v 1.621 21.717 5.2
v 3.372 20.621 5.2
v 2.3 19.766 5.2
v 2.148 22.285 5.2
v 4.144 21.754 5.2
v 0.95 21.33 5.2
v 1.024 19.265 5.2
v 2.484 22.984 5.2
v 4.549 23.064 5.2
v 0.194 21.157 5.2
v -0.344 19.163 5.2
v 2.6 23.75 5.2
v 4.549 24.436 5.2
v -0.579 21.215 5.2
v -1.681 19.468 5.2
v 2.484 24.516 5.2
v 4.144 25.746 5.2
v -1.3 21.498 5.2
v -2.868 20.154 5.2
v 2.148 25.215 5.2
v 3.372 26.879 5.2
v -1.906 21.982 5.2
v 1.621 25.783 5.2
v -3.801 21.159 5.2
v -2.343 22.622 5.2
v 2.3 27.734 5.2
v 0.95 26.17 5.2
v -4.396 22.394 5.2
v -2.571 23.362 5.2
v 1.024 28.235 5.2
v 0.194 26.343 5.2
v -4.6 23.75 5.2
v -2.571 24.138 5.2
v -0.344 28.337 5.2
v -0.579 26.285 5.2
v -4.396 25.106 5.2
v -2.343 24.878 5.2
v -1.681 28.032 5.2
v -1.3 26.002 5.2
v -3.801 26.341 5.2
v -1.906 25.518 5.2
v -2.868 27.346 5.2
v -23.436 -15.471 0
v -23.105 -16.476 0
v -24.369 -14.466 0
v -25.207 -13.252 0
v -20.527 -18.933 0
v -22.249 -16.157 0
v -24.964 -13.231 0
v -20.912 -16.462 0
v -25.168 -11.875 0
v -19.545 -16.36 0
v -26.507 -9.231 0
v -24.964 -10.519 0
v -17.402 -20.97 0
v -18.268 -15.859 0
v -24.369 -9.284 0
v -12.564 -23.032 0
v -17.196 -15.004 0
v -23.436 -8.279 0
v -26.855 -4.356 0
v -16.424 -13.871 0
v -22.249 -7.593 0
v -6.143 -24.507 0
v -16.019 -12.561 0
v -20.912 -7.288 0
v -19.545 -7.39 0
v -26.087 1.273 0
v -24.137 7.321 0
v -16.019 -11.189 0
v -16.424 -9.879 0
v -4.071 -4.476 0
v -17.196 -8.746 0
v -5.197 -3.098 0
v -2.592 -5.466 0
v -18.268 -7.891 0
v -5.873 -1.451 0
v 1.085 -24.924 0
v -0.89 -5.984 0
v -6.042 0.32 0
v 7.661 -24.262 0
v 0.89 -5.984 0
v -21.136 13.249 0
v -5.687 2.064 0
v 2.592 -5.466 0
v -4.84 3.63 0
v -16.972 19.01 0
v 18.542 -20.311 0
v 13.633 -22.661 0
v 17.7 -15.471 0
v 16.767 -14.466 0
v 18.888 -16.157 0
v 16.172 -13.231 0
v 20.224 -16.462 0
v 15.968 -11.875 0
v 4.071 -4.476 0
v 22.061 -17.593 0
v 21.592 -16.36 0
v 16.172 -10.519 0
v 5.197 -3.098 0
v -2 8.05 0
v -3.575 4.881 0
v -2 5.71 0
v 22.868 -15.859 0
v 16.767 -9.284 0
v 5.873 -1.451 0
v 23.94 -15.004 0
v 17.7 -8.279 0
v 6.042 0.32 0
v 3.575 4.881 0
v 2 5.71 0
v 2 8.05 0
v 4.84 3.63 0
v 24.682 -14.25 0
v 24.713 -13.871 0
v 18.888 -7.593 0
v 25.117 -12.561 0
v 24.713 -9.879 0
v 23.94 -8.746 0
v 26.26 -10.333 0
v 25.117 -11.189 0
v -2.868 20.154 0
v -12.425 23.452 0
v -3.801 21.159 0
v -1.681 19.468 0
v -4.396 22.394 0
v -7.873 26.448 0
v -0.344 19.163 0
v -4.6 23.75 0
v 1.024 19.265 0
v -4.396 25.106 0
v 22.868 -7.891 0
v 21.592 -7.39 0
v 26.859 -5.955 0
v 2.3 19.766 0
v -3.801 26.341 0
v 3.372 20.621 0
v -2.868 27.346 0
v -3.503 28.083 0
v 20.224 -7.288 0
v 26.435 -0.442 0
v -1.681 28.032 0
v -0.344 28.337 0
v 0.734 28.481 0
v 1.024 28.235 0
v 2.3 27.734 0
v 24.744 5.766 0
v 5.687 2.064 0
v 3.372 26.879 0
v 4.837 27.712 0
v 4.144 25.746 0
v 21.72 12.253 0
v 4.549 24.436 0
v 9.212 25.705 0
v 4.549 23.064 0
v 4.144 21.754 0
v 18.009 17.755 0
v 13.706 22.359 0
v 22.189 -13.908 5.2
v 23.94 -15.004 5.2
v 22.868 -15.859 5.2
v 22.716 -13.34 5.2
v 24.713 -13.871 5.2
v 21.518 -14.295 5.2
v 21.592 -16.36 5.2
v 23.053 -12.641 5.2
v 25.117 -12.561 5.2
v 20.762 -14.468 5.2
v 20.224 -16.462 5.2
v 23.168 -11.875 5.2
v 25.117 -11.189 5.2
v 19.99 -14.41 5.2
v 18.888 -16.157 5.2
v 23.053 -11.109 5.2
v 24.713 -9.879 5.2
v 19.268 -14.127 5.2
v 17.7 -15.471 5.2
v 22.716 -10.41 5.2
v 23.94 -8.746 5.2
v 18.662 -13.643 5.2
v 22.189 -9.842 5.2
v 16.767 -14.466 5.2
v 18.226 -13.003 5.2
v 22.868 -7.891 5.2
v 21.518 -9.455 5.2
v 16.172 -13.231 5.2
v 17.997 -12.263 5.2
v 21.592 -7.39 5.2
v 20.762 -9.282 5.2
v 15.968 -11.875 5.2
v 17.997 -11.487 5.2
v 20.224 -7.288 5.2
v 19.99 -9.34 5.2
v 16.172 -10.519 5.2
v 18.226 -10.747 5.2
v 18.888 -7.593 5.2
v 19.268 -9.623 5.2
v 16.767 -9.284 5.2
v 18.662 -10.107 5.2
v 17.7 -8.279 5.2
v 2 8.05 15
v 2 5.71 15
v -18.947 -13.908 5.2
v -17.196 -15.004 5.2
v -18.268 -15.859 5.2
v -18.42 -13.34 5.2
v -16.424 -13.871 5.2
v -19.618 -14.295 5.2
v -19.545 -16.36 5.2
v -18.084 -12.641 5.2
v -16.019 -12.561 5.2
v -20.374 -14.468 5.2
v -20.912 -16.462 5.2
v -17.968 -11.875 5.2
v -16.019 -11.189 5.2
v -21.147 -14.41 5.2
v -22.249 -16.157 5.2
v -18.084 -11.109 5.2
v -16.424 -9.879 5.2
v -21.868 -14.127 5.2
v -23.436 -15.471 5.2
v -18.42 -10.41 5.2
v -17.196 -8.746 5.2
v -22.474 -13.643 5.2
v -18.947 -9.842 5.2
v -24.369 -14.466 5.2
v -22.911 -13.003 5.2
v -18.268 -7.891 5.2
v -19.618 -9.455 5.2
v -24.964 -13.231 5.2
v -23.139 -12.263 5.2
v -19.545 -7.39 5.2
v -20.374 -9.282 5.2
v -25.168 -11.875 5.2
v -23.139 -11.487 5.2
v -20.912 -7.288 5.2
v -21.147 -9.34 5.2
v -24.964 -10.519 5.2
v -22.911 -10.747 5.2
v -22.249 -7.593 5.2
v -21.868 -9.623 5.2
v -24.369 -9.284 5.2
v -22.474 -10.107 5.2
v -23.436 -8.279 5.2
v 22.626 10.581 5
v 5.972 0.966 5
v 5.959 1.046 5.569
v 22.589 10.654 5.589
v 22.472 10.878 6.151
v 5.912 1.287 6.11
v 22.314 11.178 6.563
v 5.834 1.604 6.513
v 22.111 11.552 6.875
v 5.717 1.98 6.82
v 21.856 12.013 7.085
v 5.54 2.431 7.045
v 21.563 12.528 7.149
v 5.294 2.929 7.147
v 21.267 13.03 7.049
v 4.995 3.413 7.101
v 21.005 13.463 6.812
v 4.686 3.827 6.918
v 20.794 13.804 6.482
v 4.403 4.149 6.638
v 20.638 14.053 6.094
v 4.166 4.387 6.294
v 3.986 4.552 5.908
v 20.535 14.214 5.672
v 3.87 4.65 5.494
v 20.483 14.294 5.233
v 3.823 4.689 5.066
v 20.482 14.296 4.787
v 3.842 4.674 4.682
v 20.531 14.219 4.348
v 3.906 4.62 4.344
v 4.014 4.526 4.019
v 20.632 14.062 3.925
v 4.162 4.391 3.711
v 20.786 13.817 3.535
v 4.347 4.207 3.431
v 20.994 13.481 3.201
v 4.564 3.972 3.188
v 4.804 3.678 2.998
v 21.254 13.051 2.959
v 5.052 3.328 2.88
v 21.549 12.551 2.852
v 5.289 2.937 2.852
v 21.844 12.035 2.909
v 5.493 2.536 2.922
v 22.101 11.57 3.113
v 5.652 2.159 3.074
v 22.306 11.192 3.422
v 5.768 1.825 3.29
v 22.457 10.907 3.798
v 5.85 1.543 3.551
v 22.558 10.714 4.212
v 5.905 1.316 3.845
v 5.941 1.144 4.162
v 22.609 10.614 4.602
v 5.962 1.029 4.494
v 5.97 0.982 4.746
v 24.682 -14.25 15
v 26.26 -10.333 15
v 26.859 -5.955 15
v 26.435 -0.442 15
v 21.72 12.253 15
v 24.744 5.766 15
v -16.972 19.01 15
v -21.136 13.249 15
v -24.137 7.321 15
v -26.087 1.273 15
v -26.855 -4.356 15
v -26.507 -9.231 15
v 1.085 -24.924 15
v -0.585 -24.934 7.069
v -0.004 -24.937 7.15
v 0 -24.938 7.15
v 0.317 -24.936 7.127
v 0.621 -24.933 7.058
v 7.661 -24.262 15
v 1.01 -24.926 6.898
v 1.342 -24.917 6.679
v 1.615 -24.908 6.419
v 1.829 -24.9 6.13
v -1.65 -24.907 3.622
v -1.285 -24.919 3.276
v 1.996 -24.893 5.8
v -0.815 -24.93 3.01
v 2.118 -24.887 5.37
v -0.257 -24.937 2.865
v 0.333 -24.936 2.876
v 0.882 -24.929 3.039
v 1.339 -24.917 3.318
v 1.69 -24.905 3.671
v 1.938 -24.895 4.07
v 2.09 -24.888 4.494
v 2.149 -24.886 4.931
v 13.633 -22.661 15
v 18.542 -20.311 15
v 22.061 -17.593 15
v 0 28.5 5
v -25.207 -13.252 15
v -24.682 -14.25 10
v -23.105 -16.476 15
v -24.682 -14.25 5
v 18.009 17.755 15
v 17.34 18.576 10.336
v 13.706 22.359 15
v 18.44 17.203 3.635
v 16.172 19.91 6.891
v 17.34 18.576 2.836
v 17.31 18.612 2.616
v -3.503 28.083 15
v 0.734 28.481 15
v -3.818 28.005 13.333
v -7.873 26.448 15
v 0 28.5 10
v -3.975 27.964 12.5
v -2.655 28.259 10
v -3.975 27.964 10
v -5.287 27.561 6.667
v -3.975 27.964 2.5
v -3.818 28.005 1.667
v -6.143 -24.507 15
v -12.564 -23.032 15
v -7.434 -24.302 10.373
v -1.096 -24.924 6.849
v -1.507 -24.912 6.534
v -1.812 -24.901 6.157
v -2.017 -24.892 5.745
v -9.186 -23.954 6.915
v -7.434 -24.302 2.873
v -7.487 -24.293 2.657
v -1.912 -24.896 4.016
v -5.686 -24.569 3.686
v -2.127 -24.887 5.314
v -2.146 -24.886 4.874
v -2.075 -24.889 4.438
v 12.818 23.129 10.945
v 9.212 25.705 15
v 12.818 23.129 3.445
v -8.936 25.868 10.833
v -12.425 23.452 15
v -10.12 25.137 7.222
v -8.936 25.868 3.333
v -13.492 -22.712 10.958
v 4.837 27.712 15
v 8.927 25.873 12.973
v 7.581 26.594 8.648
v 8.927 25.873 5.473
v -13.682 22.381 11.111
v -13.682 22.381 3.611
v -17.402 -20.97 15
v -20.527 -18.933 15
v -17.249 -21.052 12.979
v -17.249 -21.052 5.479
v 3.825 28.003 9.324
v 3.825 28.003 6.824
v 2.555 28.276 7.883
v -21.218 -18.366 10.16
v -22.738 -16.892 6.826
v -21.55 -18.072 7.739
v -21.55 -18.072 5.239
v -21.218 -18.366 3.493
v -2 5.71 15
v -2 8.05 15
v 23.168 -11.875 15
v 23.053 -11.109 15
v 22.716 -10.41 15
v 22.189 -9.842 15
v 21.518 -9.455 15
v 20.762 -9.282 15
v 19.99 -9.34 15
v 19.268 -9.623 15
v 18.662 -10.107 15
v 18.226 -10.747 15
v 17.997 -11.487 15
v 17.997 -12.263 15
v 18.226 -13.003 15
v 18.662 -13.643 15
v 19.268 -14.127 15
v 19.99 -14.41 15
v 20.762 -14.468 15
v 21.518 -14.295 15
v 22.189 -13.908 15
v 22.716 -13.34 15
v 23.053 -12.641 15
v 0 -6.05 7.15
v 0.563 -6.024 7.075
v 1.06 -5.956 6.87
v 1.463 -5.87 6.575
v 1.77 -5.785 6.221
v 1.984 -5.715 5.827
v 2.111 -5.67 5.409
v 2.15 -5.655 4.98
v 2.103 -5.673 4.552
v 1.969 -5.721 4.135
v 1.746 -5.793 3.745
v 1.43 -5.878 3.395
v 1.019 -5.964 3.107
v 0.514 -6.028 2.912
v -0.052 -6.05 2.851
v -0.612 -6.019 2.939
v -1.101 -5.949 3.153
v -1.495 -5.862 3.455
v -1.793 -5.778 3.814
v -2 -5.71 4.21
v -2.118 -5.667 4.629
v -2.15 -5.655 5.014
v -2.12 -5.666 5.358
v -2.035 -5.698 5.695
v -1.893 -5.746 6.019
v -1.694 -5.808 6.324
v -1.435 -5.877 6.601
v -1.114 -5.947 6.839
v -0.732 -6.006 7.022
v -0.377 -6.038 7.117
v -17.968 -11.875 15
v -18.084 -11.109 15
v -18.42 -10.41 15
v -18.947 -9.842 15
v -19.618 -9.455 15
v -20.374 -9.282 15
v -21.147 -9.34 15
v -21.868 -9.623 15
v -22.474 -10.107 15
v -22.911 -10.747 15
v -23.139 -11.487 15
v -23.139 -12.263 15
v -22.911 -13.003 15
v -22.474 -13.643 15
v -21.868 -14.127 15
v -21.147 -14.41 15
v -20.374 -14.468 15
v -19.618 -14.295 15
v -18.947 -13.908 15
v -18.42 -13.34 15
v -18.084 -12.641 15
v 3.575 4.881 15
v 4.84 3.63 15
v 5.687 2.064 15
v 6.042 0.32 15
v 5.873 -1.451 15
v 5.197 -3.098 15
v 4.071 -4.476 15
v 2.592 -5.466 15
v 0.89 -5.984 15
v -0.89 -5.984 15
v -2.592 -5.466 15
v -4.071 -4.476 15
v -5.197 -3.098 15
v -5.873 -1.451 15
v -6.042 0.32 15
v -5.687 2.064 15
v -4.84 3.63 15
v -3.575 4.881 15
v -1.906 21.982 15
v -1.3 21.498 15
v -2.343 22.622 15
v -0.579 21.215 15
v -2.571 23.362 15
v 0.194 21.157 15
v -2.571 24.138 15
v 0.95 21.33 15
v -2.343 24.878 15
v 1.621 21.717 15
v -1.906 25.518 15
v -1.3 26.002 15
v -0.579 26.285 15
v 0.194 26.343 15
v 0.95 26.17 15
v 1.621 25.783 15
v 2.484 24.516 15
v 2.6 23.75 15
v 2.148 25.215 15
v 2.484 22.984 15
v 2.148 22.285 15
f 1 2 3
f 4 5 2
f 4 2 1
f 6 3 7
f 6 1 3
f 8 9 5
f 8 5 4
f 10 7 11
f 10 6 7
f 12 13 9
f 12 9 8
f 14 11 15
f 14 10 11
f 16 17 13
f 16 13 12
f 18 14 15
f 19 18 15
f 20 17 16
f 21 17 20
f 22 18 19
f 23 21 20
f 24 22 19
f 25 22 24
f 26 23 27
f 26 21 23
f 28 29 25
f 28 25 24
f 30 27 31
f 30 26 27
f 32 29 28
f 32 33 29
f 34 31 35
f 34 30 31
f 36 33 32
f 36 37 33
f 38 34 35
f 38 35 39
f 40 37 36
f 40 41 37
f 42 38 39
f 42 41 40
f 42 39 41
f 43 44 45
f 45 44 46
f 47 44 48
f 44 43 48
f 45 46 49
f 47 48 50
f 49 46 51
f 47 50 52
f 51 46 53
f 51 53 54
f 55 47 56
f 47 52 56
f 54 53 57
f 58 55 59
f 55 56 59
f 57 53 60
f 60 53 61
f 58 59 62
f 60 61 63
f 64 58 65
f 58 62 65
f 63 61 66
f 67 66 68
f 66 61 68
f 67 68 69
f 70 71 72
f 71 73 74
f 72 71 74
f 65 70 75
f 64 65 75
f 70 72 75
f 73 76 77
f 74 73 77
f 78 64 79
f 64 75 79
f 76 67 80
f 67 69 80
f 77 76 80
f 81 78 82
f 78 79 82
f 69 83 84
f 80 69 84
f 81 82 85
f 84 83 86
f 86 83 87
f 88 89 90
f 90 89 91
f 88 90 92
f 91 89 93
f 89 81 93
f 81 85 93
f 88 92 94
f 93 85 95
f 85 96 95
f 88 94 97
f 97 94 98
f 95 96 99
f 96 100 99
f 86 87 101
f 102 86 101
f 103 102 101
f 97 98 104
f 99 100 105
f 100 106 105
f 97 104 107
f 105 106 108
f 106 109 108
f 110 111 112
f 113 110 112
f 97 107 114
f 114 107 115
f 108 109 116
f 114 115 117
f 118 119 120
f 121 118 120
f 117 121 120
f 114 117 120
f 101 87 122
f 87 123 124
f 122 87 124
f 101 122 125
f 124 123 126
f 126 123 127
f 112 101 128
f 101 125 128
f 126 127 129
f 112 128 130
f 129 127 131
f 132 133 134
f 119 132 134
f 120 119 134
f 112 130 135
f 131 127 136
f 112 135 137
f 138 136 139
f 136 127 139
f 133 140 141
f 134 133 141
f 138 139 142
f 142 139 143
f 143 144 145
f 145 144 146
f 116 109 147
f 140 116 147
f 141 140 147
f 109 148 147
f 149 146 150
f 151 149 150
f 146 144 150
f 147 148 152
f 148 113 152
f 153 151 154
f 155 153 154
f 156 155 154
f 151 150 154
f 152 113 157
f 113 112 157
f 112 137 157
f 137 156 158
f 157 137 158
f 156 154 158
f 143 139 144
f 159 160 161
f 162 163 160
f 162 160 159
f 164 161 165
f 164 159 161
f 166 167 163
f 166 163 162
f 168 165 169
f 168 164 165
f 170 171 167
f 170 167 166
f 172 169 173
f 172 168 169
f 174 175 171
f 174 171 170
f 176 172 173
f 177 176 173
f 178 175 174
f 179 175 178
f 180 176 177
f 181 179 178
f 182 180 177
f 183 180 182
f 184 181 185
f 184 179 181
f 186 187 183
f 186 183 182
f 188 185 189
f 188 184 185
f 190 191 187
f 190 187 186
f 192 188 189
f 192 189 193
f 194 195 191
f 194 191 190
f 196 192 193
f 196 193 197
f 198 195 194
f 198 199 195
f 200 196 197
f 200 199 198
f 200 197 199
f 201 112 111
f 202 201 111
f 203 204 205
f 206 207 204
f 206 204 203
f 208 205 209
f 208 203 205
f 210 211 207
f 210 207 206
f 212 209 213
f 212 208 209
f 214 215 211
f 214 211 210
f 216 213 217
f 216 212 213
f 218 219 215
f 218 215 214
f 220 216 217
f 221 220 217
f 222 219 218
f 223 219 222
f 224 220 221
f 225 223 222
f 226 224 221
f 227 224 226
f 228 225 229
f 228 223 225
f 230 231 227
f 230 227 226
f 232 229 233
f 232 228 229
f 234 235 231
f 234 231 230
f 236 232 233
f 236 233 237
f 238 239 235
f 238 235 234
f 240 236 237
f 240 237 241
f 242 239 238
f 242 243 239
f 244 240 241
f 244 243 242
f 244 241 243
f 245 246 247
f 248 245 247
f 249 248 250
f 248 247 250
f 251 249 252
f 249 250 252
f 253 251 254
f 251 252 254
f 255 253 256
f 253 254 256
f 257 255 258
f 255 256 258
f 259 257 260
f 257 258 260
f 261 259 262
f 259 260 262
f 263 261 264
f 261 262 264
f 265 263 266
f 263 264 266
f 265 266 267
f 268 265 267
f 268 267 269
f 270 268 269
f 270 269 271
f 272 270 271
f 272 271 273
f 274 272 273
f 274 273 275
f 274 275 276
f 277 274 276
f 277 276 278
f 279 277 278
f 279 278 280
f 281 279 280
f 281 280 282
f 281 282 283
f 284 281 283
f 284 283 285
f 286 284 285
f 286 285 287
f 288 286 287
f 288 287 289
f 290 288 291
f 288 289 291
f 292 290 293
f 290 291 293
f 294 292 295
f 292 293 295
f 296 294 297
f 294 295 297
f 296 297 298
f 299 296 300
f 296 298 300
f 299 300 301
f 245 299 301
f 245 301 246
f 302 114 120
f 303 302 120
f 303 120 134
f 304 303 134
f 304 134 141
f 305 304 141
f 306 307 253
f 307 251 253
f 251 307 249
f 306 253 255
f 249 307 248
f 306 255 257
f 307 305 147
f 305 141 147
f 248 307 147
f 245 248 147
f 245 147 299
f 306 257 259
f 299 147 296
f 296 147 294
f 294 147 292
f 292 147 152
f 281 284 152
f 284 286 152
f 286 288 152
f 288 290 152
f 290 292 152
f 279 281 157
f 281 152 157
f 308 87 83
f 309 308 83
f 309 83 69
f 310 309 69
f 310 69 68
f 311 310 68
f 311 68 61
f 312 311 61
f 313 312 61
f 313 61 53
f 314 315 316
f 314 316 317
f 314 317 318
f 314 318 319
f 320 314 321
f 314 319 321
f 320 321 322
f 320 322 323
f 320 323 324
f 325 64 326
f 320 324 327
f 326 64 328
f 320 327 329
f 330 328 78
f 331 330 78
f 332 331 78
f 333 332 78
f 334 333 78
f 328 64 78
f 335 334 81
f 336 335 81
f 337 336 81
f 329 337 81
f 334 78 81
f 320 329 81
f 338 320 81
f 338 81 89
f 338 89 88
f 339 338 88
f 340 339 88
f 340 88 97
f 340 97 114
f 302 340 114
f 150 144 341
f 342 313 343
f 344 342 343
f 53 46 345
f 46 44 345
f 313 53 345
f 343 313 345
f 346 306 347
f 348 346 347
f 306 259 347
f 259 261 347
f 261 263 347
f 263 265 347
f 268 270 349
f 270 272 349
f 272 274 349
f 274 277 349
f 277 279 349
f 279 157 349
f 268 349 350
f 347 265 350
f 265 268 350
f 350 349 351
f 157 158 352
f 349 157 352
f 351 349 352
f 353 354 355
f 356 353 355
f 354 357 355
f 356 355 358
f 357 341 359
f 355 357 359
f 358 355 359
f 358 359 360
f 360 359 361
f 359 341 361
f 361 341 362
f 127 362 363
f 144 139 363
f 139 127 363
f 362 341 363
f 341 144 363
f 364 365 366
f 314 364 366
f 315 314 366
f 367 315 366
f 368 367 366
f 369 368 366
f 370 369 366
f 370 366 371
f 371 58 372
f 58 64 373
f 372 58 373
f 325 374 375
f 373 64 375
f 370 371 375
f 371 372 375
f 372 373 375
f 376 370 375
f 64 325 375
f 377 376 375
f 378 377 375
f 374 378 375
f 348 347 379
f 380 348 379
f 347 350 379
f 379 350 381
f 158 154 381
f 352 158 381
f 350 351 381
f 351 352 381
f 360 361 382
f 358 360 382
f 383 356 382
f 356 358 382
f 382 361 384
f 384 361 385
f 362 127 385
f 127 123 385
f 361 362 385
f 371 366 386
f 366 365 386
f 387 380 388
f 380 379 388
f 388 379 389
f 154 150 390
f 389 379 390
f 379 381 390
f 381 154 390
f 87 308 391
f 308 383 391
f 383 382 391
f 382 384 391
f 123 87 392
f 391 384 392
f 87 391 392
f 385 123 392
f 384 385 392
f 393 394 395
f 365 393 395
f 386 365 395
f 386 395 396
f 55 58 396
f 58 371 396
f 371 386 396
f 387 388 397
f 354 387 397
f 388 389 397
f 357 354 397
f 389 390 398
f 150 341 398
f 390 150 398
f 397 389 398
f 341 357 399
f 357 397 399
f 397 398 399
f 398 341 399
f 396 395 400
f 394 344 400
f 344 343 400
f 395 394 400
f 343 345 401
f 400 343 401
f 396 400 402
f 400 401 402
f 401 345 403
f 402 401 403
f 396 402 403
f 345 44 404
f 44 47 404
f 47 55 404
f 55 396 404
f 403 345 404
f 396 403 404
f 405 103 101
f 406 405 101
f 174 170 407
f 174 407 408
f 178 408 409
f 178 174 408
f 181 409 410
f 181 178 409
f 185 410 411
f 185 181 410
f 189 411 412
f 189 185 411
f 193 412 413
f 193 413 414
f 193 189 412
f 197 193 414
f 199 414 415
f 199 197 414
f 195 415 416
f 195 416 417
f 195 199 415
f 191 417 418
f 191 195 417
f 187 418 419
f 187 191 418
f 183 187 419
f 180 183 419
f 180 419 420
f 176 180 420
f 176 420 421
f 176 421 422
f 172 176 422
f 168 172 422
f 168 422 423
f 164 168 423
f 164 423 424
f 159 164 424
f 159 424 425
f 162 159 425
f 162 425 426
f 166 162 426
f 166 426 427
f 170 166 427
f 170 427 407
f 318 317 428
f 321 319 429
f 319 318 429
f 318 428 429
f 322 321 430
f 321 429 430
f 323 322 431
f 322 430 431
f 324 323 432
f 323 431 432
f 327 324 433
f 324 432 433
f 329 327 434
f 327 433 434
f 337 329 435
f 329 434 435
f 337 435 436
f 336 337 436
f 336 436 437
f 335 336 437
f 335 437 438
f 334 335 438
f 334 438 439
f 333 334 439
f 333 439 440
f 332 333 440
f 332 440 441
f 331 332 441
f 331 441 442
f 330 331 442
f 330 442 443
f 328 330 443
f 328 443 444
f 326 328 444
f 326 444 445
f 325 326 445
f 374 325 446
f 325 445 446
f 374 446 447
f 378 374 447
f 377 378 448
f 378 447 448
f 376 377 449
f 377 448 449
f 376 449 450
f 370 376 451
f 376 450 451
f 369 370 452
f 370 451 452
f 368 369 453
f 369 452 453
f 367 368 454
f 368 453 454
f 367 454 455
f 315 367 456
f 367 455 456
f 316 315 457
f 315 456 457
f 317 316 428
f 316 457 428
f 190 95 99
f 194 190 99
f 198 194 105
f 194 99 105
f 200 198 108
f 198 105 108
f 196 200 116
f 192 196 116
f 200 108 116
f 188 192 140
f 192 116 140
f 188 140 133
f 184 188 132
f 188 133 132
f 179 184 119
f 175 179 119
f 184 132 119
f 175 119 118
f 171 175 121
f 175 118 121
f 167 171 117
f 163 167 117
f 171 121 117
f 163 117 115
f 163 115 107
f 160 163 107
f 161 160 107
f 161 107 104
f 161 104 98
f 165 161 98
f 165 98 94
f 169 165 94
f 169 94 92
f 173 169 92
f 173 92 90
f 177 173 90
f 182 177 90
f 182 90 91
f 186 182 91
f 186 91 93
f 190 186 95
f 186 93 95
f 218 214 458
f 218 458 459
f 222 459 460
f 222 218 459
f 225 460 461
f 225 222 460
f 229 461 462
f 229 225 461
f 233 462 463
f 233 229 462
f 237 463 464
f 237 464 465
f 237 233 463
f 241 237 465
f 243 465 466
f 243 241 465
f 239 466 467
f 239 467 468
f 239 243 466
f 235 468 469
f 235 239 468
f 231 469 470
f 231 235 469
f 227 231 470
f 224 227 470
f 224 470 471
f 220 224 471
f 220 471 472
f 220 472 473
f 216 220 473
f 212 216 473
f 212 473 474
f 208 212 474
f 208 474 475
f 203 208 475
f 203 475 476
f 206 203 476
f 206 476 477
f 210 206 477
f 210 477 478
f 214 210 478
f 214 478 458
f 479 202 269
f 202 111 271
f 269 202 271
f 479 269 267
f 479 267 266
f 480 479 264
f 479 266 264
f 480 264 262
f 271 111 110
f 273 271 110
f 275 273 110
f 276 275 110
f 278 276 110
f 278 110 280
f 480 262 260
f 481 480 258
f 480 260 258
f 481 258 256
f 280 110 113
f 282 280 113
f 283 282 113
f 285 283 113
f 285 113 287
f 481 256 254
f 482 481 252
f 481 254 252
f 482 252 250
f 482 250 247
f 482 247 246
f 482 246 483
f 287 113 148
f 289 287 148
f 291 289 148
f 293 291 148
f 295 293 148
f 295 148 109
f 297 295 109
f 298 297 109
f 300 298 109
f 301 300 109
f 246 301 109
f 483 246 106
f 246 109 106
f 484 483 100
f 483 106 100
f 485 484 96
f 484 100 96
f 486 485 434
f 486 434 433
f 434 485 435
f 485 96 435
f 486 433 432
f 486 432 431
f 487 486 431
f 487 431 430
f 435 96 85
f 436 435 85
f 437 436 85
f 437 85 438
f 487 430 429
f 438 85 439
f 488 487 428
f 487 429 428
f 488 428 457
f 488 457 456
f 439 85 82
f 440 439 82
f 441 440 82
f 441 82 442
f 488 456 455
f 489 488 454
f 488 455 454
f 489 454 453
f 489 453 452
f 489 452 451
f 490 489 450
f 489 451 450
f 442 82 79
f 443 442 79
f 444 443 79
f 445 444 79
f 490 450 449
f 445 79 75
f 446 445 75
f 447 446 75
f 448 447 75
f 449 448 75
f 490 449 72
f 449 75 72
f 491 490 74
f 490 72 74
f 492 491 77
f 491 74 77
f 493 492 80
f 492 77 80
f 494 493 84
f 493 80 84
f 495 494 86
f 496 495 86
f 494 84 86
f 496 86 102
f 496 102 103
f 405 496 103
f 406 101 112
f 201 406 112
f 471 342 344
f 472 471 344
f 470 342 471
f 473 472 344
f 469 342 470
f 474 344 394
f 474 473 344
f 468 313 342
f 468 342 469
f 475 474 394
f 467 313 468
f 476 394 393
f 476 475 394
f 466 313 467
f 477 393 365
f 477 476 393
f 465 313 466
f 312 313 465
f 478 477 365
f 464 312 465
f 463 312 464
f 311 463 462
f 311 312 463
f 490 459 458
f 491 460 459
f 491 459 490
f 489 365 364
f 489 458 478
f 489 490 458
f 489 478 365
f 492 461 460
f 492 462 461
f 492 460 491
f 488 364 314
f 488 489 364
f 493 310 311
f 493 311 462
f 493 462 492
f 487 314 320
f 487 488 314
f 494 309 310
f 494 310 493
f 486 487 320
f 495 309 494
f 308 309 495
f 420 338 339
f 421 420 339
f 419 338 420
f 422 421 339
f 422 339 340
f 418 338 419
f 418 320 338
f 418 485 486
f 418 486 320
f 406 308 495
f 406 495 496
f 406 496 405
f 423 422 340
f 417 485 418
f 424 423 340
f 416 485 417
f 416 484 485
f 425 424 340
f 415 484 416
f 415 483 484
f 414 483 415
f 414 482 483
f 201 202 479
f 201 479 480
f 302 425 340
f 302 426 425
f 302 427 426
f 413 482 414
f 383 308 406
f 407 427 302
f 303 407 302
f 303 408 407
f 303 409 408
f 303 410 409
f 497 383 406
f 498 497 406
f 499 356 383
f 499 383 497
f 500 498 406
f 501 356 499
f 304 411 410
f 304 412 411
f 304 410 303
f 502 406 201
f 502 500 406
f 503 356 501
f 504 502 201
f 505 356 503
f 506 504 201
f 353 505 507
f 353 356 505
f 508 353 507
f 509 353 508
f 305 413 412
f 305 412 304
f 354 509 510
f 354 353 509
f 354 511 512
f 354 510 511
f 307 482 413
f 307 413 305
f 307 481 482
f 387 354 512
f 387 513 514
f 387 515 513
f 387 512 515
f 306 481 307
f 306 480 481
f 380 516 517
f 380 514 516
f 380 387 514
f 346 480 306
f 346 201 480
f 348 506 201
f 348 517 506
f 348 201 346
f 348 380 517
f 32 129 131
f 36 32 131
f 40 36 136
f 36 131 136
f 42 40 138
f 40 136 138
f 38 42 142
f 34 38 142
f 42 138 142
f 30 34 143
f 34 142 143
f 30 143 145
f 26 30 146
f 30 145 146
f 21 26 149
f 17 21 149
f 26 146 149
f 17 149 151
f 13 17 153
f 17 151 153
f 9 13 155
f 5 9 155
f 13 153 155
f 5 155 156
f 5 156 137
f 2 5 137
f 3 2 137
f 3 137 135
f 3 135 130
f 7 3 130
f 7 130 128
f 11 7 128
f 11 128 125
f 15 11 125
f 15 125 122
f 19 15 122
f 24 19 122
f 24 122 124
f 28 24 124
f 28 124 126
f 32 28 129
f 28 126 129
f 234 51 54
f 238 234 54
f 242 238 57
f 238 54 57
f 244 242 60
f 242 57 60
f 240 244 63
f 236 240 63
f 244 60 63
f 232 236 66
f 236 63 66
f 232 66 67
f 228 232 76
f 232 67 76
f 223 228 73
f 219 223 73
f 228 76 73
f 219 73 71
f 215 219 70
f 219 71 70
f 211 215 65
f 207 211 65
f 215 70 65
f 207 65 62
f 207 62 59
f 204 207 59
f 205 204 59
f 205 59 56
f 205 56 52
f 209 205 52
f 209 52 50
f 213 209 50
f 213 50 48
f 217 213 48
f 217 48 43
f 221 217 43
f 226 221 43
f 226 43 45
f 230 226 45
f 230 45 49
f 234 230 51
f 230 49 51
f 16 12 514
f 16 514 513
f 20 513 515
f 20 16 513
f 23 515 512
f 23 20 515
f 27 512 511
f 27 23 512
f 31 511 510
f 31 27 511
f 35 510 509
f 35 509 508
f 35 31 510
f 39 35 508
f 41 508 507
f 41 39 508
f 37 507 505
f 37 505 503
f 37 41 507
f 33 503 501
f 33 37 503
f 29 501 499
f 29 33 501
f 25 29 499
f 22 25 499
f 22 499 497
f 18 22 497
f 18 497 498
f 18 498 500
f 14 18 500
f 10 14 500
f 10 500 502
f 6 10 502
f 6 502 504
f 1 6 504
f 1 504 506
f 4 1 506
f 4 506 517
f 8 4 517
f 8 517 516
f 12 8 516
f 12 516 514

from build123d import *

# Parameters (mm, degrees)
SKETCH_1_R           = 2.6
EXTRUDE_1_DEPTH      = 15
SKETCH_13_R          = 2.15
CUT_EXTRUDE_10_DEPTH = 42.943414433
SKETCH_14_R          = 2.15
CUT_EXTRUDE_11_DEPTH = 42.943414433
SKETCH_15_R          = 4.6
CUT_EXTRUDE_12_DEPTH = 5.2


with BuildPart() as part:
    # ｽｹｯﾁ1 → ﾎﾞｽ - 押し出し1 (new body)
    with BuildSketch(Plane.XY):
        with BuildLine():
            add(Edge.make_bspline(
                [(24.681724008, -14.25), (32.908965344, 0), (-1.1e-08, 56.999999981), (-49.363447804, -28.499999633), (16.454482294, -28.500000089), (24.681724008, -14.25)],
                knots=[0, 0, 0, 0, 0.333333333, 0.666666668, 0.999999999, 0.999999999, 0.999999999, 0.999999999], degree=3))
        make_face()
        with Locations((-20.56810334, -11.875)):
            Circle(SKETCH_1_R, mode=Mode.SUBTRACT)
        with BuildLine():
            Line((-2, 5.709859893), (-2, 8.05))
            Line((-2, 8.05), (2, 8.05))
            Line((2, 8.05), (2, 5.709859893))
            ThreePointArc((2, 5.709859893), (0, -6.05), (-2, 5.709859893))
        make_face(mode=Mode.SUBTRACT)
        with Locations((0, 23.75)):
            Circle(SKETCH_1_R, mode=Mode.SUBTRACT)
        with Locations((20.56810334, -11.875)):
            Circle(SKETCH_1_R, mode=Mode.SUBTRACT)
    extrude(amount=EXTRUDE_1_DEPTH)

    # ｽｹｯﾁ13 → ｶｯﾄ - 押し出し10 (cut, through all)
    with BuildSketch(Plane(origin=(0, 0, 0), x_dir=(1, 0, 0), z_dir=(0, 1, 0))):
        with Locations((0, -5)):
            Circle(SKETCH_13_R)
    extrude(amount=-CUT_EXTRUDE_10_DEPTH, mode=Mode.SUBTRACT)

    # ｽｹｯﾁ14 → ｶｯﾄ - 押し出し11 (cut, through all)
    with BuildSketch(Plane(origin=(0, 0, 0), x_dir=(0, 0, 1), z_dir=(-0.8660254037844364, -0.5000000000000041, 0))):
        with Locations((5, 0)):
            Circle(SKETCH_14_R)
    extrude(amount=-CUT_EXTRUDE_11_DEPTH, mode=Mode.SUBTRACT)

    # ｽｹｯﾁ15 → ｶｯﾄ - 押し出し12 (cut)
    with BuildSketch(Plane(origin=(0, 0, 0), x_dir=(-1, 0, 0), z_dir=(0, 0, -1))):
        with Locations((-20.56810334, -11.875)):
            Circle(SKETCH_15_R)
        with Locations((0, 23.75)):
            Circle(SKETCH_15_R)
        with Locations((20.56810334, -11.875)):
            Circle(SKETCH_15_R)
    extrude(amount=-CUT_EXTRUDE_12_DEPTH, mode=Mode.SUBTRACT)


solid = part.part
